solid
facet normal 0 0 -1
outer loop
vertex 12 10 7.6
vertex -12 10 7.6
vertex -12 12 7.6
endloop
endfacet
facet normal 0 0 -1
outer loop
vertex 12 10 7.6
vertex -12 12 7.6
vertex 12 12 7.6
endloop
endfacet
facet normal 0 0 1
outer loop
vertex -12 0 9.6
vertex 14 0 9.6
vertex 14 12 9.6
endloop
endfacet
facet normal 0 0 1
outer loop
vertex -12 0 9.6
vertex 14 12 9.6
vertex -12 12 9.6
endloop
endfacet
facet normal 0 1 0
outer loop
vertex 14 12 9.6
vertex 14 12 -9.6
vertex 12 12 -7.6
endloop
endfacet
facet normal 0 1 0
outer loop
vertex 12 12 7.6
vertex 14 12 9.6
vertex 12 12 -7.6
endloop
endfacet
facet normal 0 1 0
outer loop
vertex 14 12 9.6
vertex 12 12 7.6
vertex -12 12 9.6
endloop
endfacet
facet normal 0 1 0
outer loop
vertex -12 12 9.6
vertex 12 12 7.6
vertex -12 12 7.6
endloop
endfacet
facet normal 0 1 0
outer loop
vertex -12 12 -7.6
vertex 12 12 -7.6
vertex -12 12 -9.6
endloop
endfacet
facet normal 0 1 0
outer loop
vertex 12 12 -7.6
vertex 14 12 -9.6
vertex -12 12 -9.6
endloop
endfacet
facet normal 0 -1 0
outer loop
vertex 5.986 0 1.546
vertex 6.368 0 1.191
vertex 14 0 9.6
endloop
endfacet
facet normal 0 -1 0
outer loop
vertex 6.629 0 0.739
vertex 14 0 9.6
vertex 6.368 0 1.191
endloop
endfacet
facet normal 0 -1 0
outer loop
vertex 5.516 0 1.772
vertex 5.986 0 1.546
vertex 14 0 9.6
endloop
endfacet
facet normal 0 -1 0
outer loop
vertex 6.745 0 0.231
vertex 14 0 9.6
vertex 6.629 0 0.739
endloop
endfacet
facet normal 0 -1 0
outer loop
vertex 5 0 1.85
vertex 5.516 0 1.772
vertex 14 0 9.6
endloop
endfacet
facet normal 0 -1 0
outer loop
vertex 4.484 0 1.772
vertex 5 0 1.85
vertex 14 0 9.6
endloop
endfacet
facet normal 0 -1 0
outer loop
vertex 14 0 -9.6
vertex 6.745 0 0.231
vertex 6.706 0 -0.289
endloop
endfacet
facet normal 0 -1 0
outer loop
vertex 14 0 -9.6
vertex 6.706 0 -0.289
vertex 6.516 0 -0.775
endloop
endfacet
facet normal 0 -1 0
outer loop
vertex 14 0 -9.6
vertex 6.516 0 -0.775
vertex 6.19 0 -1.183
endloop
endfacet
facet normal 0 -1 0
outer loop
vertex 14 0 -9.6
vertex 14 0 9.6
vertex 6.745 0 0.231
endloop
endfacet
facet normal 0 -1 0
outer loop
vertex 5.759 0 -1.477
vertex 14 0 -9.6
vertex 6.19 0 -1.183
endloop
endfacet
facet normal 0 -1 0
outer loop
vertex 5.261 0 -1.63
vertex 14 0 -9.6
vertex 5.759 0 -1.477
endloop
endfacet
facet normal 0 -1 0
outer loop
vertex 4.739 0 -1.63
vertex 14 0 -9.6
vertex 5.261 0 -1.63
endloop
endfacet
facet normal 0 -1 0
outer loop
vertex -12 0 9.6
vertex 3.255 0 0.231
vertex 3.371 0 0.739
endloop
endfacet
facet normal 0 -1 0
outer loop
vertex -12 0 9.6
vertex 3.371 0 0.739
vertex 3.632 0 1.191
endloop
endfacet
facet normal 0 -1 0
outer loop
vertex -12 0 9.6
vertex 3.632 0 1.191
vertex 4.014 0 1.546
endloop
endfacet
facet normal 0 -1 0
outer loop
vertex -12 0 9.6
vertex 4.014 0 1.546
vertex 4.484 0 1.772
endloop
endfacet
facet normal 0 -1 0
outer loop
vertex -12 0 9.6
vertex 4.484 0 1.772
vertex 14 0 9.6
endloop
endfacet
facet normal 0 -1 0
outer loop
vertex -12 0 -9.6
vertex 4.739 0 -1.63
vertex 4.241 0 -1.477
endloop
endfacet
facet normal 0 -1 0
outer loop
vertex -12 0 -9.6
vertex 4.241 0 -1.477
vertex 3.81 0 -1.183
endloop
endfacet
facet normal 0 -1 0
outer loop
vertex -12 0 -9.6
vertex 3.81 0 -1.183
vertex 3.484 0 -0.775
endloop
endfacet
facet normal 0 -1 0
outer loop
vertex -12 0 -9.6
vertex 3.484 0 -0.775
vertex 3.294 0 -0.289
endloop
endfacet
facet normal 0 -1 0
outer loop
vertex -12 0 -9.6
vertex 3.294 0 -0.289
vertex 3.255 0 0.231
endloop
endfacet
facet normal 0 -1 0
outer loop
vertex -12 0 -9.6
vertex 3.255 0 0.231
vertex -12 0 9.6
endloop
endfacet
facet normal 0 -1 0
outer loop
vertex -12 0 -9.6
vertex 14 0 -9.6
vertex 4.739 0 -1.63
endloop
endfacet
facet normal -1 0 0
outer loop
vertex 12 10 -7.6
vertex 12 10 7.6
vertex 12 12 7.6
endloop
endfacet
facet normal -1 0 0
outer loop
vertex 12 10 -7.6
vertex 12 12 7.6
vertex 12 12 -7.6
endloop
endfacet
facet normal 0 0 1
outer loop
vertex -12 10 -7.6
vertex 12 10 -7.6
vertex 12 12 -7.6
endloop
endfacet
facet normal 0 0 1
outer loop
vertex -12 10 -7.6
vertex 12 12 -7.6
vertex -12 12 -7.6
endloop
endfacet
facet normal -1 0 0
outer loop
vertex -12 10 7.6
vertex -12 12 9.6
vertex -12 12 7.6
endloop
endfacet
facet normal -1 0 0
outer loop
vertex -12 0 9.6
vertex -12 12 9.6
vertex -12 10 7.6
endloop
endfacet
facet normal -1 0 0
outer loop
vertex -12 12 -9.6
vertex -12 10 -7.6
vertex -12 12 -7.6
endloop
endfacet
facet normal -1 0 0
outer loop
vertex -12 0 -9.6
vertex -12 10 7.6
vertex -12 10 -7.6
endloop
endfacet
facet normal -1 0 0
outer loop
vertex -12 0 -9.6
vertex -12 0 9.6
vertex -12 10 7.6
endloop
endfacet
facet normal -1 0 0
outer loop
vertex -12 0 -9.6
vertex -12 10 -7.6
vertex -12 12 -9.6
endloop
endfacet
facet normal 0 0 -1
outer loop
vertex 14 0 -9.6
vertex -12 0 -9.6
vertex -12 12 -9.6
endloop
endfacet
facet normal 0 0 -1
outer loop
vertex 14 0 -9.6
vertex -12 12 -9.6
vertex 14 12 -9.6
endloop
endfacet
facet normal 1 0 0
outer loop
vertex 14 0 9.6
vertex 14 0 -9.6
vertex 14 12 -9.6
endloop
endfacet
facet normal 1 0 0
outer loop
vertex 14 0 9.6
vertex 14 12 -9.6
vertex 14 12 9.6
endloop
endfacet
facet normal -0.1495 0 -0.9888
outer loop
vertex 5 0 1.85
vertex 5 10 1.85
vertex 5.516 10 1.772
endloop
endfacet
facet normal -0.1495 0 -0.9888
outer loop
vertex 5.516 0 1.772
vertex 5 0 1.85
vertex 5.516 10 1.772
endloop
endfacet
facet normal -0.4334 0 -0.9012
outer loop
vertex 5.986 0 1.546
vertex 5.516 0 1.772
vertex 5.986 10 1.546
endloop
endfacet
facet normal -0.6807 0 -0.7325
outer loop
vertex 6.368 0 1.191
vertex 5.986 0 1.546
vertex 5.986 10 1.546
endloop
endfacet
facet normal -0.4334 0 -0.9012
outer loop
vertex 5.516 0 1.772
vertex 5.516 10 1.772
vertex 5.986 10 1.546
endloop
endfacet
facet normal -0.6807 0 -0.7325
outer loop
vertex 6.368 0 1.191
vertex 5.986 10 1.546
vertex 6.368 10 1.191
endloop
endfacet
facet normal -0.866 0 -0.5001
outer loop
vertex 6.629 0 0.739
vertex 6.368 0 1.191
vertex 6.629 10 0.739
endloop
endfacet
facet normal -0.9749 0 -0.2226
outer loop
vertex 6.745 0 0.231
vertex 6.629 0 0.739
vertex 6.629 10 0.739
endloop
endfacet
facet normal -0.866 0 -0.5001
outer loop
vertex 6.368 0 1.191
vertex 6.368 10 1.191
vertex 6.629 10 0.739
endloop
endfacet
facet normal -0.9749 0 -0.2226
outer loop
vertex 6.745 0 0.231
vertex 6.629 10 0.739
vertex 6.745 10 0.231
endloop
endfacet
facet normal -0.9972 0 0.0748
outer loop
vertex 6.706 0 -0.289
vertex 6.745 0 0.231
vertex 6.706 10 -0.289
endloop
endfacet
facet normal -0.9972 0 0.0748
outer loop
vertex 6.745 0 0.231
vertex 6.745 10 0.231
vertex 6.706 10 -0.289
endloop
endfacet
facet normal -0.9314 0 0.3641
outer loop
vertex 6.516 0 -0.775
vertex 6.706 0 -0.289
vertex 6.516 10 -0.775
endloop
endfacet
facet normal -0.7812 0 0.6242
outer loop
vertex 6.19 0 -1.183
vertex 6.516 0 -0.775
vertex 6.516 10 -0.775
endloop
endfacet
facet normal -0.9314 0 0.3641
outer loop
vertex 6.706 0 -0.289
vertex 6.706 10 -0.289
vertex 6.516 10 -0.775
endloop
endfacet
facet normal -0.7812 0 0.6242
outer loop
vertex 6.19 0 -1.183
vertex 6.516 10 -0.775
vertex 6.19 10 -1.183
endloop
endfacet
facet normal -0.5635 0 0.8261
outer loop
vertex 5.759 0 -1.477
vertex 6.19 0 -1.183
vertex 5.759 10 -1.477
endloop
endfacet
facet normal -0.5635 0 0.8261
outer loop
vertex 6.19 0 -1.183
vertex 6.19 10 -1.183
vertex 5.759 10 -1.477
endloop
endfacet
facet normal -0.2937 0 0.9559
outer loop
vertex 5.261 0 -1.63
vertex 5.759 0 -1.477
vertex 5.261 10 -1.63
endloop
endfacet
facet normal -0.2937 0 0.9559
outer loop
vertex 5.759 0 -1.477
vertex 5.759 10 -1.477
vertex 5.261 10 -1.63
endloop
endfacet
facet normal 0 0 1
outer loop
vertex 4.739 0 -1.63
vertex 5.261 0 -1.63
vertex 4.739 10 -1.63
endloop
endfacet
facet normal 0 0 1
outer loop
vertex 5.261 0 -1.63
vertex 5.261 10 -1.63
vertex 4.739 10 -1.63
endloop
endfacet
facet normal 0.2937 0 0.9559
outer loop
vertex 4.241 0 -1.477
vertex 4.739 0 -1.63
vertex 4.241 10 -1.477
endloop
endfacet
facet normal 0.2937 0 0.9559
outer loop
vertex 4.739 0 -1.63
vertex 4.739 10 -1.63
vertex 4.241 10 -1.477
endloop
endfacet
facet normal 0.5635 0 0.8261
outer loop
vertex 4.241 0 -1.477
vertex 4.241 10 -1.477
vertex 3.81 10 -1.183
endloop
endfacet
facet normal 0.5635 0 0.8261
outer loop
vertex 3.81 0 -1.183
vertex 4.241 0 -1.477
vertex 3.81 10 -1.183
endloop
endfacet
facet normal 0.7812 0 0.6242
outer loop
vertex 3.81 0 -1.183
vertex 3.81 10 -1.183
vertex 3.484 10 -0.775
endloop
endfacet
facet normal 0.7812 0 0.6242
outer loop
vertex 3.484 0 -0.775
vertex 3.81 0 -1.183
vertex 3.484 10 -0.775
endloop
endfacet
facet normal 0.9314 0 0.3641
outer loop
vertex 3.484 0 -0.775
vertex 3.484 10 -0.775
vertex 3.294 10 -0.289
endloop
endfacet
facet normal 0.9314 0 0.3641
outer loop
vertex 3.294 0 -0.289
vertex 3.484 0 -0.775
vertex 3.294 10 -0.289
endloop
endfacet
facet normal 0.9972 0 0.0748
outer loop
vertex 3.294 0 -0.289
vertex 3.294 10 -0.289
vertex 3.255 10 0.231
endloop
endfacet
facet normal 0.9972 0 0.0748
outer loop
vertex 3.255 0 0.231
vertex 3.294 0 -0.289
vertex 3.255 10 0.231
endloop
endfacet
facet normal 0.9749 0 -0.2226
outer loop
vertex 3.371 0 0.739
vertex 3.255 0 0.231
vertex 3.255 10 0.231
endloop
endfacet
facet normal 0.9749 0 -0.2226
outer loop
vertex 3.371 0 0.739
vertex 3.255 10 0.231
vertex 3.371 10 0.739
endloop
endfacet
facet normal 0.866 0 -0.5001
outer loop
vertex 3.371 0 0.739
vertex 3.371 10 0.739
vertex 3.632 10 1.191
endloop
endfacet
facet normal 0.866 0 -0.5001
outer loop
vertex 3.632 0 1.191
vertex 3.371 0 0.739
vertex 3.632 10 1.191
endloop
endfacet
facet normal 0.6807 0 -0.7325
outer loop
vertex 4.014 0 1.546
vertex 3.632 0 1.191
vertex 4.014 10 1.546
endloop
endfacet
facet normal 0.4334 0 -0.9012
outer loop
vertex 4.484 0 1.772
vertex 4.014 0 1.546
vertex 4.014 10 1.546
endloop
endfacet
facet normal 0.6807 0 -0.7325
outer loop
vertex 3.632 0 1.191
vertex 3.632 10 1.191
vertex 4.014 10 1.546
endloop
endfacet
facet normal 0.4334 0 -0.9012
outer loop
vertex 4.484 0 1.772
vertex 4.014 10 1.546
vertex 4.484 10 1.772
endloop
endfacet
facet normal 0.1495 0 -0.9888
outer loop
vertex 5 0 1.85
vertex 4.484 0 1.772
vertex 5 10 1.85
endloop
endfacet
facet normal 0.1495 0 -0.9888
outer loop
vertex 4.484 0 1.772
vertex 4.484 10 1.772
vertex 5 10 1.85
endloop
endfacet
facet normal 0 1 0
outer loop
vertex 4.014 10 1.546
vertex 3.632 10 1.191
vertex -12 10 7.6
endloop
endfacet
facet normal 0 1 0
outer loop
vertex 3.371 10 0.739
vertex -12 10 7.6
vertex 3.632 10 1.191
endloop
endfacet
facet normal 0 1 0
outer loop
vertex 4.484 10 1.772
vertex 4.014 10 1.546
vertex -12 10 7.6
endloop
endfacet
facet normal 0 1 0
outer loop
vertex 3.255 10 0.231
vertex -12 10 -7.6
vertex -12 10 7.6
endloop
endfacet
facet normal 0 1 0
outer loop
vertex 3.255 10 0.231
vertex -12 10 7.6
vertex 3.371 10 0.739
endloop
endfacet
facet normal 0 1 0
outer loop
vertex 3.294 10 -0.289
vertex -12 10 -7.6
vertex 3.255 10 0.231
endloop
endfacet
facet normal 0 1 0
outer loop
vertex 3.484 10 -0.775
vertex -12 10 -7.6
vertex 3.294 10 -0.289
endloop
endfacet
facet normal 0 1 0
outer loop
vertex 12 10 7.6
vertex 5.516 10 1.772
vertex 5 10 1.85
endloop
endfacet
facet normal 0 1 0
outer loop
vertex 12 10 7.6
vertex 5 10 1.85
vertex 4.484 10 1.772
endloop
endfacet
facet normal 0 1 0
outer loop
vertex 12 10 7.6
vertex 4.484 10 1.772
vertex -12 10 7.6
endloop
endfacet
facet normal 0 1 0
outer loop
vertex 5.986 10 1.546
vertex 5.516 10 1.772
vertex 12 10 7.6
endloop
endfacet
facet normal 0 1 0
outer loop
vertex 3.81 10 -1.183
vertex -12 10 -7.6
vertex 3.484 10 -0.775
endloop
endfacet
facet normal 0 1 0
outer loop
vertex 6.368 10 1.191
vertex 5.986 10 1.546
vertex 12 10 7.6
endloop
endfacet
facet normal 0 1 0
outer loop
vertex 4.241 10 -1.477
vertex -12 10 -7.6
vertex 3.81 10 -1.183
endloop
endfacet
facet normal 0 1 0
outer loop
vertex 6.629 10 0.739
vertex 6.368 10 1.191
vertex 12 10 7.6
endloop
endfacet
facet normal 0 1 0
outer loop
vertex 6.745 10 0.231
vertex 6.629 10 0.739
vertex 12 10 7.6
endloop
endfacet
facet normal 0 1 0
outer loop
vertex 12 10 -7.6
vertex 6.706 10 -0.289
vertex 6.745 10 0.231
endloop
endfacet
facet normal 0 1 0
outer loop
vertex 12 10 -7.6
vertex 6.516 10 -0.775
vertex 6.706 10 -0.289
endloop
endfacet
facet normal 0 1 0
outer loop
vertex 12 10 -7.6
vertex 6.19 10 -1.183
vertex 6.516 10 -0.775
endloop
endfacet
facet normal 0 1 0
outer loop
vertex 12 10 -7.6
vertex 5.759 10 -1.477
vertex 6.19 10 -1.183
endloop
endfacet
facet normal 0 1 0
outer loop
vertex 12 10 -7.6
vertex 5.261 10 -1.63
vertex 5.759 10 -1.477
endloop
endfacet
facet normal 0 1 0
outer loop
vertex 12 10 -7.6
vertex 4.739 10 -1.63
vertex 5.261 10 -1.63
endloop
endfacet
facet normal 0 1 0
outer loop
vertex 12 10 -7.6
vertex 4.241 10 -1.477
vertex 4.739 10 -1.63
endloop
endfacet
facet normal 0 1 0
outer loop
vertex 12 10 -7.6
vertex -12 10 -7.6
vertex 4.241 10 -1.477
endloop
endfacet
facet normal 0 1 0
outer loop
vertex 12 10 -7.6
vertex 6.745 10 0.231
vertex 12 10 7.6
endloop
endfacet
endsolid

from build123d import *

# Parameters (mm, degrees)
SKETCH1_W           = 24
SKETCH1_H           = 15.2
BOSS_EXTRUDE1_DEPTH = 10
SKETCH3_R           = 1.75
CUT_EXTRUDE1_DEPTH  = 10
BOSS_EXTRUDE2_DEPTH = 12


with BuildPart() as part:
    # Sketch1 → Boss-Extrude1 (new body)
    with BuildSketch(Plane(origin=(0, 0, 0), x_dir=(1, 0, 0), z_dir=(0, 1, 0))):
        Rectangle(SKETCH1_W, SKETCH1_H)
    extrude(amount=BOSS_EXTRUDE1_DEPTH)

    # Sketch3 → Cut-Extrude1 (cut)
    with BuildSketch(Plane(origin=(0, 10, 0), x_dir=(1, 0, 0), z_dir=(0, 1, 0))):
        with Locations(Location((5, -0.1, 0), (0, 0, 270))):
            Circle(SKETCH3_R)
    extrude(amount=-CUT_EXTRUDE1_DEPTH, mode=Mode.SUBTRACT)

    # Sketch4 → Boss-Extrude2 (add)
    with BuildSketch(Plane(origin=(0, 0, 0), x_dir=(-1, 0, 0), z_dir=(0, -1, 0))):
        Polygon((12, -9.6), (12, -7.6), (-12, -7.6), (-12, 7.6), (12, 7.6), (12, 9.6), (-14, 9.6), (-14, -9.6), align=None)
    extrude(amount=-BOSS_EXTRUDE2_DEPTH)


solid = part.part
